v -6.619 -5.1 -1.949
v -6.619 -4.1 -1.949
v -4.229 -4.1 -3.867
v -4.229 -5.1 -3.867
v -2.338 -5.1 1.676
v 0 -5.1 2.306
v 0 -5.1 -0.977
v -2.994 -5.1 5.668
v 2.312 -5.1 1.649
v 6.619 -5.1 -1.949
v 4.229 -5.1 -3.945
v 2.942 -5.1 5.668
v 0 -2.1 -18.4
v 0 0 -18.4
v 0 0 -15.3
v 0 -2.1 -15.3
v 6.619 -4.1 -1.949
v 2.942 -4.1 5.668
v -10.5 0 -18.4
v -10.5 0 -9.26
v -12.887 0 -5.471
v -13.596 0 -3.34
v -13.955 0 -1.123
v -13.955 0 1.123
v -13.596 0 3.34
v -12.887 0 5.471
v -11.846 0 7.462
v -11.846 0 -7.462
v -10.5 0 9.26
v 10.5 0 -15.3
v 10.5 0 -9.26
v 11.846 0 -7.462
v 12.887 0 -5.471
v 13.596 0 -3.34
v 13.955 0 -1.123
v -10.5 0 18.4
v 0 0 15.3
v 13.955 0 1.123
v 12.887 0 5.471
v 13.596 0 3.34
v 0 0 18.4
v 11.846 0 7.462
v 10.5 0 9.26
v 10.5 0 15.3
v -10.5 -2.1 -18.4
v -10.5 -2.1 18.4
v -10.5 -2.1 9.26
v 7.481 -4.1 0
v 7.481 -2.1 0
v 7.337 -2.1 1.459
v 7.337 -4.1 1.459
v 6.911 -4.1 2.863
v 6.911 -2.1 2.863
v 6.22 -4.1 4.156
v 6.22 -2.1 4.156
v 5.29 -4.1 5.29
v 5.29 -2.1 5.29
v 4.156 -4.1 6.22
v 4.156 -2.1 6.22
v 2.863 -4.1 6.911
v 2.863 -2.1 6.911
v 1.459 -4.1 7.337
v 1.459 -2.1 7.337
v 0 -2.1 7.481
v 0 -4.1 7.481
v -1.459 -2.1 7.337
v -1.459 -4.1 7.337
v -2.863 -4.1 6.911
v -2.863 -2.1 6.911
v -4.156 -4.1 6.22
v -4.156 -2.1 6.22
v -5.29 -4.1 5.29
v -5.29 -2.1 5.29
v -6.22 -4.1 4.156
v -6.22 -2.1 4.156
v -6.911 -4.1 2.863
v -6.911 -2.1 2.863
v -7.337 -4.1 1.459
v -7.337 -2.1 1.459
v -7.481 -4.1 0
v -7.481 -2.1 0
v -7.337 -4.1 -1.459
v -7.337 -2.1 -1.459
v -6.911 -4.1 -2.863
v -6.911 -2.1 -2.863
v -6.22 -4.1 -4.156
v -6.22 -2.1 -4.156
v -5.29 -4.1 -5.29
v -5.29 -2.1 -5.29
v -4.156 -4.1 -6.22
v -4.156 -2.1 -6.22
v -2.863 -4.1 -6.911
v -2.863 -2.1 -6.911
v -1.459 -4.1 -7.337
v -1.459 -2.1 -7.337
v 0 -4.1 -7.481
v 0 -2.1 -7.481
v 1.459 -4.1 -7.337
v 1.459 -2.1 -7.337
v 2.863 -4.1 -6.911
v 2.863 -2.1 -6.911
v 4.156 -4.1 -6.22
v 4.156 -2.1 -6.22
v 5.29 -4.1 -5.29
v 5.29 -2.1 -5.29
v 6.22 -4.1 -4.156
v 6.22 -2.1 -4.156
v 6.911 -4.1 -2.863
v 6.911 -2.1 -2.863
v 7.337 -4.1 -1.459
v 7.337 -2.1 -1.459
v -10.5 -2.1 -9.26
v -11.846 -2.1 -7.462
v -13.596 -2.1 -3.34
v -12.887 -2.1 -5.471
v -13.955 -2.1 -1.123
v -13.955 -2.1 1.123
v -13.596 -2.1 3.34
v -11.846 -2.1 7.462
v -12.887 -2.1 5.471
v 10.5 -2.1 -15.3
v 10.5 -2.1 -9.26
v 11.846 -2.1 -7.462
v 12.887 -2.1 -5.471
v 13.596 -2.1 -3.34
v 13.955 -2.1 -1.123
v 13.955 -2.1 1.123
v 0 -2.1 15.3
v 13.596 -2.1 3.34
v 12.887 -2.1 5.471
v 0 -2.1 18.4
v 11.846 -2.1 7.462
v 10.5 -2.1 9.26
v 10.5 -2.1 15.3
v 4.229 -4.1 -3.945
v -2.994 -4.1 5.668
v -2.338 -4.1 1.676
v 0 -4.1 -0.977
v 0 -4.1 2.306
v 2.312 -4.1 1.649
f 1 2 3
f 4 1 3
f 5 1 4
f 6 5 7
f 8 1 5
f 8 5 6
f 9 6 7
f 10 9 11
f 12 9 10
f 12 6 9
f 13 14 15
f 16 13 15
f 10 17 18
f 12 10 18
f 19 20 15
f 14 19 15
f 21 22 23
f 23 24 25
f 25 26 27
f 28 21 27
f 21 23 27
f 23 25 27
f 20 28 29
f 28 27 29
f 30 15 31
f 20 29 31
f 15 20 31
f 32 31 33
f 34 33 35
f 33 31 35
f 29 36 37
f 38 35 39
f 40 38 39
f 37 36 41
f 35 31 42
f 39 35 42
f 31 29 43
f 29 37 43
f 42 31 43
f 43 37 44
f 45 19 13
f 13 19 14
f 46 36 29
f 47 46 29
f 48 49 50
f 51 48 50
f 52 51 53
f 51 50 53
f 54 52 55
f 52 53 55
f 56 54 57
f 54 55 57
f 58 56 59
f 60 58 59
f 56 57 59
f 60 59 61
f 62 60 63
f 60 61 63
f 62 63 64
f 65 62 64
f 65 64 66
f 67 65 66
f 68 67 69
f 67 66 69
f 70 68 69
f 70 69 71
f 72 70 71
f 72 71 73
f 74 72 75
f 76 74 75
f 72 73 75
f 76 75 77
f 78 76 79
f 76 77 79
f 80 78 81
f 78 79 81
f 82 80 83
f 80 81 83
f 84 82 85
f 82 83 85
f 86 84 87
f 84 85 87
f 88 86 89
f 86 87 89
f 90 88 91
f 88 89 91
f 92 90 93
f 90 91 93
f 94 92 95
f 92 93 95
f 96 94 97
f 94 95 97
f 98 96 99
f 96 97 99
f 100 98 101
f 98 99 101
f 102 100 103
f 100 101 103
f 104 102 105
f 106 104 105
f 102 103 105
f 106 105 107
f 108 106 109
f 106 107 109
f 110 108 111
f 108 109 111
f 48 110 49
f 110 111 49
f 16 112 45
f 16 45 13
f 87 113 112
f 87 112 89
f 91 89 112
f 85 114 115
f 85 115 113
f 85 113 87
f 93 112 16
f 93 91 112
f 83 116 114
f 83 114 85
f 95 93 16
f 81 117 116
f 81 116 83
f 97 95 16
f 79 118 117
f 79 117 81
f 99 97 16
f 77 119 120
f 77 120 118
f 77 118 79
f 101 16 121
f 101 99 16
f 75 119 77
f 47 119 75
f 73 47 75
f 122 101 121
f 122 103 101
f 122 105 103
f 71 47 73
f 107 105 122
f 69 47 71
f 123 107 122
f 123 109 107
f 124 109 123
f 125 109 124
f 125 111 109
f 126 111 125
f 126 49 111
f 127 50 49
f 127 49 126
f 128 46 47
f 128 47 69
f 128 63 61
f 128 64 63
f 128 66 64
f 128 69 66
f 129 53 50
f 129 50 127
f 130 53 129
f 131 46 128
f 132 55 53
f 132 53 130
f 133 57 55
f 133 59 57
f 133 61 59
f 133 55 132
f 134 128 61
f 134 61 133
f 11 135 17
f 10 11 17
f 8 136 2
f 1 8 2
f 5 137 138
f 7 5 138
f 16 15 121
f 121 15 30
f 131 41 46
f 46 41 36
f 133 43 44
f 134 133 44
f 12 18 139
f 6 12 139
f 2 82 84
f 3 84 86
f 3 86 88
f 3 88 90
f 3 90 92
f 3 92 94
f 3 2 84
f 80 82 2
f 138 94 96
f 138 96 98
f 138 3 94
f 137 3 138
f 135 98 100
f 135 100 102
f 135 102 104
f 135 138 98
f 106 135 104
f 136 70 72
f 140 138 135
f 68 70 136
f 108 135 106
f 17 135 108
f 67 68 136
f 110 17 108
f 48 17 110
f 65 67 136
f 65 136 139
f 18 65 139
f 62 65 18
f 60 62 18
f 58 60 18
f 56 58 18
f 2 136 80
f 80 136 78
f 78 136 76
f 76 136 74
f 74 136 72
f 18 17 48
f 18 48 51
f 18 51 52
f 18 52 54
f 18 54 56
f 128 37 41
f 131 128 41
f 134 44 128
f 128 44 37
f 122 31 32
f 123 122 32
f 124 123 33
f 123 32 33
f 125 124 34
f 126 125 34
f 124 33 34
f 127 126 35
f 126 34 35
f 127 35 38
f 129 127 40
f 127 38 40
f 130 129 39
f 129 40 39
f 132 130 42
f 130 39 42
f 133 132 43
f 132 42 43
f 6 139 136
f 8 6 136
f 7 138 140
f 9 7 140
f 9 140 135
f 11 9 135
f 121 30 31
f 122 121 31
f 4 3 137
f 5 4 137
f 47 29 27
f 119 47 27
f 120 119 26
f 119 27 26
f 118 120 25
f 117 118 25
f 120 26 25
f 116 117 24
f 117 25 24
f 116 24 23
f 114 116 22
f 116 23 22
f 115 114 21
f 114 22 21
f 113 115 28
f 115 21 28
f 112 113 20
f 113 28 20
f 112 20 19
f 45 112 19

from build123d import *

# Parameters (mm, degrees)
F1_DEPTH = 2.1
F3_DEPTH = 3
F2_R     = 7.4807460639
F4_DEPTH = 2


# Not quite as in the source:
# - a feature names something its author has since deleted; it is built from what else it names


with BuildPart() as f1:
    # F0 (on Front) → F1 (new body)
    with BuildSketch(Plane.XZ):
        with BuildLine():
            Line((0, 15.3), (0, 18.4))
            Line((0, 18.4), (-10.5, 18.4))
            Line((-10.5, 18.4), (-10.5, 9.2601295887))
            ThreePointArc((-10.5, 9.2601295887), (-14, 0), (-10.5, -9.2601295887))
            Line((-10.5, -9.2601295887), (-10.5, -18.4))
            Line((-10.5, -18.4), (0, -18.4))
            Line((0, -18.4), (0, -15.3))
            Line((0, -15.3), (10.5, -15.3))
            Line((10.5, -15.3), (10.5, -9.2601295887))
            ThreePointArc((10.5, -9.2601295887), (14, 0), (10.5, 9.2601295887))
            Line((10.5, 9.2601295887), (10.5, 15.3))
            Line((10.5, 15.3), (0, 15.3))
        make_face()
    extrude(amount=F1_DEPTH)

    # F2 (on face) → F3 (join)
    with BuildSketch(Plane.XZ.offset(2.1)):
        Polygon((-2.9942439869, 5.6681009009), (-6.6190003417, -1.9491401035), (-4.228762351, -3.8665838074), (-2.3375852033, 1.6756160185), (0, -0.9772852063), (2.3115586955, 1.6493498115), (4.2290021665, -3.9453827776), (6.6192396916, -1.9491401035), (2.9419509228, 5.6681009009), (0, 2.3060084786), align=None)
    extrude(amount=F3_DEPTH)

    # F2 (on face) → F4 (join)
    with BuildSketch(Plane.XZ.offset(2.1)):
        Circle(F2_R)
        Polygon((-4.228762351, -3.8665838074), (-6.6190003417, -1.9491401035), (-2.9942439869, 5.6681009009), (0, 2.3060084786), (2.9419509228, 5.6681009009), (6.6192396916, -1.9491401035), (4.2290021665, -3.9453827776), (2.3115586955, 1.6493498115), (0, -0.9772852063), (-2.3375852033, 1.6756160185), align=None, mode=Mode.SUBTRACT)
    extrude(amount=F4_DEPTH)


solid = f1.part
